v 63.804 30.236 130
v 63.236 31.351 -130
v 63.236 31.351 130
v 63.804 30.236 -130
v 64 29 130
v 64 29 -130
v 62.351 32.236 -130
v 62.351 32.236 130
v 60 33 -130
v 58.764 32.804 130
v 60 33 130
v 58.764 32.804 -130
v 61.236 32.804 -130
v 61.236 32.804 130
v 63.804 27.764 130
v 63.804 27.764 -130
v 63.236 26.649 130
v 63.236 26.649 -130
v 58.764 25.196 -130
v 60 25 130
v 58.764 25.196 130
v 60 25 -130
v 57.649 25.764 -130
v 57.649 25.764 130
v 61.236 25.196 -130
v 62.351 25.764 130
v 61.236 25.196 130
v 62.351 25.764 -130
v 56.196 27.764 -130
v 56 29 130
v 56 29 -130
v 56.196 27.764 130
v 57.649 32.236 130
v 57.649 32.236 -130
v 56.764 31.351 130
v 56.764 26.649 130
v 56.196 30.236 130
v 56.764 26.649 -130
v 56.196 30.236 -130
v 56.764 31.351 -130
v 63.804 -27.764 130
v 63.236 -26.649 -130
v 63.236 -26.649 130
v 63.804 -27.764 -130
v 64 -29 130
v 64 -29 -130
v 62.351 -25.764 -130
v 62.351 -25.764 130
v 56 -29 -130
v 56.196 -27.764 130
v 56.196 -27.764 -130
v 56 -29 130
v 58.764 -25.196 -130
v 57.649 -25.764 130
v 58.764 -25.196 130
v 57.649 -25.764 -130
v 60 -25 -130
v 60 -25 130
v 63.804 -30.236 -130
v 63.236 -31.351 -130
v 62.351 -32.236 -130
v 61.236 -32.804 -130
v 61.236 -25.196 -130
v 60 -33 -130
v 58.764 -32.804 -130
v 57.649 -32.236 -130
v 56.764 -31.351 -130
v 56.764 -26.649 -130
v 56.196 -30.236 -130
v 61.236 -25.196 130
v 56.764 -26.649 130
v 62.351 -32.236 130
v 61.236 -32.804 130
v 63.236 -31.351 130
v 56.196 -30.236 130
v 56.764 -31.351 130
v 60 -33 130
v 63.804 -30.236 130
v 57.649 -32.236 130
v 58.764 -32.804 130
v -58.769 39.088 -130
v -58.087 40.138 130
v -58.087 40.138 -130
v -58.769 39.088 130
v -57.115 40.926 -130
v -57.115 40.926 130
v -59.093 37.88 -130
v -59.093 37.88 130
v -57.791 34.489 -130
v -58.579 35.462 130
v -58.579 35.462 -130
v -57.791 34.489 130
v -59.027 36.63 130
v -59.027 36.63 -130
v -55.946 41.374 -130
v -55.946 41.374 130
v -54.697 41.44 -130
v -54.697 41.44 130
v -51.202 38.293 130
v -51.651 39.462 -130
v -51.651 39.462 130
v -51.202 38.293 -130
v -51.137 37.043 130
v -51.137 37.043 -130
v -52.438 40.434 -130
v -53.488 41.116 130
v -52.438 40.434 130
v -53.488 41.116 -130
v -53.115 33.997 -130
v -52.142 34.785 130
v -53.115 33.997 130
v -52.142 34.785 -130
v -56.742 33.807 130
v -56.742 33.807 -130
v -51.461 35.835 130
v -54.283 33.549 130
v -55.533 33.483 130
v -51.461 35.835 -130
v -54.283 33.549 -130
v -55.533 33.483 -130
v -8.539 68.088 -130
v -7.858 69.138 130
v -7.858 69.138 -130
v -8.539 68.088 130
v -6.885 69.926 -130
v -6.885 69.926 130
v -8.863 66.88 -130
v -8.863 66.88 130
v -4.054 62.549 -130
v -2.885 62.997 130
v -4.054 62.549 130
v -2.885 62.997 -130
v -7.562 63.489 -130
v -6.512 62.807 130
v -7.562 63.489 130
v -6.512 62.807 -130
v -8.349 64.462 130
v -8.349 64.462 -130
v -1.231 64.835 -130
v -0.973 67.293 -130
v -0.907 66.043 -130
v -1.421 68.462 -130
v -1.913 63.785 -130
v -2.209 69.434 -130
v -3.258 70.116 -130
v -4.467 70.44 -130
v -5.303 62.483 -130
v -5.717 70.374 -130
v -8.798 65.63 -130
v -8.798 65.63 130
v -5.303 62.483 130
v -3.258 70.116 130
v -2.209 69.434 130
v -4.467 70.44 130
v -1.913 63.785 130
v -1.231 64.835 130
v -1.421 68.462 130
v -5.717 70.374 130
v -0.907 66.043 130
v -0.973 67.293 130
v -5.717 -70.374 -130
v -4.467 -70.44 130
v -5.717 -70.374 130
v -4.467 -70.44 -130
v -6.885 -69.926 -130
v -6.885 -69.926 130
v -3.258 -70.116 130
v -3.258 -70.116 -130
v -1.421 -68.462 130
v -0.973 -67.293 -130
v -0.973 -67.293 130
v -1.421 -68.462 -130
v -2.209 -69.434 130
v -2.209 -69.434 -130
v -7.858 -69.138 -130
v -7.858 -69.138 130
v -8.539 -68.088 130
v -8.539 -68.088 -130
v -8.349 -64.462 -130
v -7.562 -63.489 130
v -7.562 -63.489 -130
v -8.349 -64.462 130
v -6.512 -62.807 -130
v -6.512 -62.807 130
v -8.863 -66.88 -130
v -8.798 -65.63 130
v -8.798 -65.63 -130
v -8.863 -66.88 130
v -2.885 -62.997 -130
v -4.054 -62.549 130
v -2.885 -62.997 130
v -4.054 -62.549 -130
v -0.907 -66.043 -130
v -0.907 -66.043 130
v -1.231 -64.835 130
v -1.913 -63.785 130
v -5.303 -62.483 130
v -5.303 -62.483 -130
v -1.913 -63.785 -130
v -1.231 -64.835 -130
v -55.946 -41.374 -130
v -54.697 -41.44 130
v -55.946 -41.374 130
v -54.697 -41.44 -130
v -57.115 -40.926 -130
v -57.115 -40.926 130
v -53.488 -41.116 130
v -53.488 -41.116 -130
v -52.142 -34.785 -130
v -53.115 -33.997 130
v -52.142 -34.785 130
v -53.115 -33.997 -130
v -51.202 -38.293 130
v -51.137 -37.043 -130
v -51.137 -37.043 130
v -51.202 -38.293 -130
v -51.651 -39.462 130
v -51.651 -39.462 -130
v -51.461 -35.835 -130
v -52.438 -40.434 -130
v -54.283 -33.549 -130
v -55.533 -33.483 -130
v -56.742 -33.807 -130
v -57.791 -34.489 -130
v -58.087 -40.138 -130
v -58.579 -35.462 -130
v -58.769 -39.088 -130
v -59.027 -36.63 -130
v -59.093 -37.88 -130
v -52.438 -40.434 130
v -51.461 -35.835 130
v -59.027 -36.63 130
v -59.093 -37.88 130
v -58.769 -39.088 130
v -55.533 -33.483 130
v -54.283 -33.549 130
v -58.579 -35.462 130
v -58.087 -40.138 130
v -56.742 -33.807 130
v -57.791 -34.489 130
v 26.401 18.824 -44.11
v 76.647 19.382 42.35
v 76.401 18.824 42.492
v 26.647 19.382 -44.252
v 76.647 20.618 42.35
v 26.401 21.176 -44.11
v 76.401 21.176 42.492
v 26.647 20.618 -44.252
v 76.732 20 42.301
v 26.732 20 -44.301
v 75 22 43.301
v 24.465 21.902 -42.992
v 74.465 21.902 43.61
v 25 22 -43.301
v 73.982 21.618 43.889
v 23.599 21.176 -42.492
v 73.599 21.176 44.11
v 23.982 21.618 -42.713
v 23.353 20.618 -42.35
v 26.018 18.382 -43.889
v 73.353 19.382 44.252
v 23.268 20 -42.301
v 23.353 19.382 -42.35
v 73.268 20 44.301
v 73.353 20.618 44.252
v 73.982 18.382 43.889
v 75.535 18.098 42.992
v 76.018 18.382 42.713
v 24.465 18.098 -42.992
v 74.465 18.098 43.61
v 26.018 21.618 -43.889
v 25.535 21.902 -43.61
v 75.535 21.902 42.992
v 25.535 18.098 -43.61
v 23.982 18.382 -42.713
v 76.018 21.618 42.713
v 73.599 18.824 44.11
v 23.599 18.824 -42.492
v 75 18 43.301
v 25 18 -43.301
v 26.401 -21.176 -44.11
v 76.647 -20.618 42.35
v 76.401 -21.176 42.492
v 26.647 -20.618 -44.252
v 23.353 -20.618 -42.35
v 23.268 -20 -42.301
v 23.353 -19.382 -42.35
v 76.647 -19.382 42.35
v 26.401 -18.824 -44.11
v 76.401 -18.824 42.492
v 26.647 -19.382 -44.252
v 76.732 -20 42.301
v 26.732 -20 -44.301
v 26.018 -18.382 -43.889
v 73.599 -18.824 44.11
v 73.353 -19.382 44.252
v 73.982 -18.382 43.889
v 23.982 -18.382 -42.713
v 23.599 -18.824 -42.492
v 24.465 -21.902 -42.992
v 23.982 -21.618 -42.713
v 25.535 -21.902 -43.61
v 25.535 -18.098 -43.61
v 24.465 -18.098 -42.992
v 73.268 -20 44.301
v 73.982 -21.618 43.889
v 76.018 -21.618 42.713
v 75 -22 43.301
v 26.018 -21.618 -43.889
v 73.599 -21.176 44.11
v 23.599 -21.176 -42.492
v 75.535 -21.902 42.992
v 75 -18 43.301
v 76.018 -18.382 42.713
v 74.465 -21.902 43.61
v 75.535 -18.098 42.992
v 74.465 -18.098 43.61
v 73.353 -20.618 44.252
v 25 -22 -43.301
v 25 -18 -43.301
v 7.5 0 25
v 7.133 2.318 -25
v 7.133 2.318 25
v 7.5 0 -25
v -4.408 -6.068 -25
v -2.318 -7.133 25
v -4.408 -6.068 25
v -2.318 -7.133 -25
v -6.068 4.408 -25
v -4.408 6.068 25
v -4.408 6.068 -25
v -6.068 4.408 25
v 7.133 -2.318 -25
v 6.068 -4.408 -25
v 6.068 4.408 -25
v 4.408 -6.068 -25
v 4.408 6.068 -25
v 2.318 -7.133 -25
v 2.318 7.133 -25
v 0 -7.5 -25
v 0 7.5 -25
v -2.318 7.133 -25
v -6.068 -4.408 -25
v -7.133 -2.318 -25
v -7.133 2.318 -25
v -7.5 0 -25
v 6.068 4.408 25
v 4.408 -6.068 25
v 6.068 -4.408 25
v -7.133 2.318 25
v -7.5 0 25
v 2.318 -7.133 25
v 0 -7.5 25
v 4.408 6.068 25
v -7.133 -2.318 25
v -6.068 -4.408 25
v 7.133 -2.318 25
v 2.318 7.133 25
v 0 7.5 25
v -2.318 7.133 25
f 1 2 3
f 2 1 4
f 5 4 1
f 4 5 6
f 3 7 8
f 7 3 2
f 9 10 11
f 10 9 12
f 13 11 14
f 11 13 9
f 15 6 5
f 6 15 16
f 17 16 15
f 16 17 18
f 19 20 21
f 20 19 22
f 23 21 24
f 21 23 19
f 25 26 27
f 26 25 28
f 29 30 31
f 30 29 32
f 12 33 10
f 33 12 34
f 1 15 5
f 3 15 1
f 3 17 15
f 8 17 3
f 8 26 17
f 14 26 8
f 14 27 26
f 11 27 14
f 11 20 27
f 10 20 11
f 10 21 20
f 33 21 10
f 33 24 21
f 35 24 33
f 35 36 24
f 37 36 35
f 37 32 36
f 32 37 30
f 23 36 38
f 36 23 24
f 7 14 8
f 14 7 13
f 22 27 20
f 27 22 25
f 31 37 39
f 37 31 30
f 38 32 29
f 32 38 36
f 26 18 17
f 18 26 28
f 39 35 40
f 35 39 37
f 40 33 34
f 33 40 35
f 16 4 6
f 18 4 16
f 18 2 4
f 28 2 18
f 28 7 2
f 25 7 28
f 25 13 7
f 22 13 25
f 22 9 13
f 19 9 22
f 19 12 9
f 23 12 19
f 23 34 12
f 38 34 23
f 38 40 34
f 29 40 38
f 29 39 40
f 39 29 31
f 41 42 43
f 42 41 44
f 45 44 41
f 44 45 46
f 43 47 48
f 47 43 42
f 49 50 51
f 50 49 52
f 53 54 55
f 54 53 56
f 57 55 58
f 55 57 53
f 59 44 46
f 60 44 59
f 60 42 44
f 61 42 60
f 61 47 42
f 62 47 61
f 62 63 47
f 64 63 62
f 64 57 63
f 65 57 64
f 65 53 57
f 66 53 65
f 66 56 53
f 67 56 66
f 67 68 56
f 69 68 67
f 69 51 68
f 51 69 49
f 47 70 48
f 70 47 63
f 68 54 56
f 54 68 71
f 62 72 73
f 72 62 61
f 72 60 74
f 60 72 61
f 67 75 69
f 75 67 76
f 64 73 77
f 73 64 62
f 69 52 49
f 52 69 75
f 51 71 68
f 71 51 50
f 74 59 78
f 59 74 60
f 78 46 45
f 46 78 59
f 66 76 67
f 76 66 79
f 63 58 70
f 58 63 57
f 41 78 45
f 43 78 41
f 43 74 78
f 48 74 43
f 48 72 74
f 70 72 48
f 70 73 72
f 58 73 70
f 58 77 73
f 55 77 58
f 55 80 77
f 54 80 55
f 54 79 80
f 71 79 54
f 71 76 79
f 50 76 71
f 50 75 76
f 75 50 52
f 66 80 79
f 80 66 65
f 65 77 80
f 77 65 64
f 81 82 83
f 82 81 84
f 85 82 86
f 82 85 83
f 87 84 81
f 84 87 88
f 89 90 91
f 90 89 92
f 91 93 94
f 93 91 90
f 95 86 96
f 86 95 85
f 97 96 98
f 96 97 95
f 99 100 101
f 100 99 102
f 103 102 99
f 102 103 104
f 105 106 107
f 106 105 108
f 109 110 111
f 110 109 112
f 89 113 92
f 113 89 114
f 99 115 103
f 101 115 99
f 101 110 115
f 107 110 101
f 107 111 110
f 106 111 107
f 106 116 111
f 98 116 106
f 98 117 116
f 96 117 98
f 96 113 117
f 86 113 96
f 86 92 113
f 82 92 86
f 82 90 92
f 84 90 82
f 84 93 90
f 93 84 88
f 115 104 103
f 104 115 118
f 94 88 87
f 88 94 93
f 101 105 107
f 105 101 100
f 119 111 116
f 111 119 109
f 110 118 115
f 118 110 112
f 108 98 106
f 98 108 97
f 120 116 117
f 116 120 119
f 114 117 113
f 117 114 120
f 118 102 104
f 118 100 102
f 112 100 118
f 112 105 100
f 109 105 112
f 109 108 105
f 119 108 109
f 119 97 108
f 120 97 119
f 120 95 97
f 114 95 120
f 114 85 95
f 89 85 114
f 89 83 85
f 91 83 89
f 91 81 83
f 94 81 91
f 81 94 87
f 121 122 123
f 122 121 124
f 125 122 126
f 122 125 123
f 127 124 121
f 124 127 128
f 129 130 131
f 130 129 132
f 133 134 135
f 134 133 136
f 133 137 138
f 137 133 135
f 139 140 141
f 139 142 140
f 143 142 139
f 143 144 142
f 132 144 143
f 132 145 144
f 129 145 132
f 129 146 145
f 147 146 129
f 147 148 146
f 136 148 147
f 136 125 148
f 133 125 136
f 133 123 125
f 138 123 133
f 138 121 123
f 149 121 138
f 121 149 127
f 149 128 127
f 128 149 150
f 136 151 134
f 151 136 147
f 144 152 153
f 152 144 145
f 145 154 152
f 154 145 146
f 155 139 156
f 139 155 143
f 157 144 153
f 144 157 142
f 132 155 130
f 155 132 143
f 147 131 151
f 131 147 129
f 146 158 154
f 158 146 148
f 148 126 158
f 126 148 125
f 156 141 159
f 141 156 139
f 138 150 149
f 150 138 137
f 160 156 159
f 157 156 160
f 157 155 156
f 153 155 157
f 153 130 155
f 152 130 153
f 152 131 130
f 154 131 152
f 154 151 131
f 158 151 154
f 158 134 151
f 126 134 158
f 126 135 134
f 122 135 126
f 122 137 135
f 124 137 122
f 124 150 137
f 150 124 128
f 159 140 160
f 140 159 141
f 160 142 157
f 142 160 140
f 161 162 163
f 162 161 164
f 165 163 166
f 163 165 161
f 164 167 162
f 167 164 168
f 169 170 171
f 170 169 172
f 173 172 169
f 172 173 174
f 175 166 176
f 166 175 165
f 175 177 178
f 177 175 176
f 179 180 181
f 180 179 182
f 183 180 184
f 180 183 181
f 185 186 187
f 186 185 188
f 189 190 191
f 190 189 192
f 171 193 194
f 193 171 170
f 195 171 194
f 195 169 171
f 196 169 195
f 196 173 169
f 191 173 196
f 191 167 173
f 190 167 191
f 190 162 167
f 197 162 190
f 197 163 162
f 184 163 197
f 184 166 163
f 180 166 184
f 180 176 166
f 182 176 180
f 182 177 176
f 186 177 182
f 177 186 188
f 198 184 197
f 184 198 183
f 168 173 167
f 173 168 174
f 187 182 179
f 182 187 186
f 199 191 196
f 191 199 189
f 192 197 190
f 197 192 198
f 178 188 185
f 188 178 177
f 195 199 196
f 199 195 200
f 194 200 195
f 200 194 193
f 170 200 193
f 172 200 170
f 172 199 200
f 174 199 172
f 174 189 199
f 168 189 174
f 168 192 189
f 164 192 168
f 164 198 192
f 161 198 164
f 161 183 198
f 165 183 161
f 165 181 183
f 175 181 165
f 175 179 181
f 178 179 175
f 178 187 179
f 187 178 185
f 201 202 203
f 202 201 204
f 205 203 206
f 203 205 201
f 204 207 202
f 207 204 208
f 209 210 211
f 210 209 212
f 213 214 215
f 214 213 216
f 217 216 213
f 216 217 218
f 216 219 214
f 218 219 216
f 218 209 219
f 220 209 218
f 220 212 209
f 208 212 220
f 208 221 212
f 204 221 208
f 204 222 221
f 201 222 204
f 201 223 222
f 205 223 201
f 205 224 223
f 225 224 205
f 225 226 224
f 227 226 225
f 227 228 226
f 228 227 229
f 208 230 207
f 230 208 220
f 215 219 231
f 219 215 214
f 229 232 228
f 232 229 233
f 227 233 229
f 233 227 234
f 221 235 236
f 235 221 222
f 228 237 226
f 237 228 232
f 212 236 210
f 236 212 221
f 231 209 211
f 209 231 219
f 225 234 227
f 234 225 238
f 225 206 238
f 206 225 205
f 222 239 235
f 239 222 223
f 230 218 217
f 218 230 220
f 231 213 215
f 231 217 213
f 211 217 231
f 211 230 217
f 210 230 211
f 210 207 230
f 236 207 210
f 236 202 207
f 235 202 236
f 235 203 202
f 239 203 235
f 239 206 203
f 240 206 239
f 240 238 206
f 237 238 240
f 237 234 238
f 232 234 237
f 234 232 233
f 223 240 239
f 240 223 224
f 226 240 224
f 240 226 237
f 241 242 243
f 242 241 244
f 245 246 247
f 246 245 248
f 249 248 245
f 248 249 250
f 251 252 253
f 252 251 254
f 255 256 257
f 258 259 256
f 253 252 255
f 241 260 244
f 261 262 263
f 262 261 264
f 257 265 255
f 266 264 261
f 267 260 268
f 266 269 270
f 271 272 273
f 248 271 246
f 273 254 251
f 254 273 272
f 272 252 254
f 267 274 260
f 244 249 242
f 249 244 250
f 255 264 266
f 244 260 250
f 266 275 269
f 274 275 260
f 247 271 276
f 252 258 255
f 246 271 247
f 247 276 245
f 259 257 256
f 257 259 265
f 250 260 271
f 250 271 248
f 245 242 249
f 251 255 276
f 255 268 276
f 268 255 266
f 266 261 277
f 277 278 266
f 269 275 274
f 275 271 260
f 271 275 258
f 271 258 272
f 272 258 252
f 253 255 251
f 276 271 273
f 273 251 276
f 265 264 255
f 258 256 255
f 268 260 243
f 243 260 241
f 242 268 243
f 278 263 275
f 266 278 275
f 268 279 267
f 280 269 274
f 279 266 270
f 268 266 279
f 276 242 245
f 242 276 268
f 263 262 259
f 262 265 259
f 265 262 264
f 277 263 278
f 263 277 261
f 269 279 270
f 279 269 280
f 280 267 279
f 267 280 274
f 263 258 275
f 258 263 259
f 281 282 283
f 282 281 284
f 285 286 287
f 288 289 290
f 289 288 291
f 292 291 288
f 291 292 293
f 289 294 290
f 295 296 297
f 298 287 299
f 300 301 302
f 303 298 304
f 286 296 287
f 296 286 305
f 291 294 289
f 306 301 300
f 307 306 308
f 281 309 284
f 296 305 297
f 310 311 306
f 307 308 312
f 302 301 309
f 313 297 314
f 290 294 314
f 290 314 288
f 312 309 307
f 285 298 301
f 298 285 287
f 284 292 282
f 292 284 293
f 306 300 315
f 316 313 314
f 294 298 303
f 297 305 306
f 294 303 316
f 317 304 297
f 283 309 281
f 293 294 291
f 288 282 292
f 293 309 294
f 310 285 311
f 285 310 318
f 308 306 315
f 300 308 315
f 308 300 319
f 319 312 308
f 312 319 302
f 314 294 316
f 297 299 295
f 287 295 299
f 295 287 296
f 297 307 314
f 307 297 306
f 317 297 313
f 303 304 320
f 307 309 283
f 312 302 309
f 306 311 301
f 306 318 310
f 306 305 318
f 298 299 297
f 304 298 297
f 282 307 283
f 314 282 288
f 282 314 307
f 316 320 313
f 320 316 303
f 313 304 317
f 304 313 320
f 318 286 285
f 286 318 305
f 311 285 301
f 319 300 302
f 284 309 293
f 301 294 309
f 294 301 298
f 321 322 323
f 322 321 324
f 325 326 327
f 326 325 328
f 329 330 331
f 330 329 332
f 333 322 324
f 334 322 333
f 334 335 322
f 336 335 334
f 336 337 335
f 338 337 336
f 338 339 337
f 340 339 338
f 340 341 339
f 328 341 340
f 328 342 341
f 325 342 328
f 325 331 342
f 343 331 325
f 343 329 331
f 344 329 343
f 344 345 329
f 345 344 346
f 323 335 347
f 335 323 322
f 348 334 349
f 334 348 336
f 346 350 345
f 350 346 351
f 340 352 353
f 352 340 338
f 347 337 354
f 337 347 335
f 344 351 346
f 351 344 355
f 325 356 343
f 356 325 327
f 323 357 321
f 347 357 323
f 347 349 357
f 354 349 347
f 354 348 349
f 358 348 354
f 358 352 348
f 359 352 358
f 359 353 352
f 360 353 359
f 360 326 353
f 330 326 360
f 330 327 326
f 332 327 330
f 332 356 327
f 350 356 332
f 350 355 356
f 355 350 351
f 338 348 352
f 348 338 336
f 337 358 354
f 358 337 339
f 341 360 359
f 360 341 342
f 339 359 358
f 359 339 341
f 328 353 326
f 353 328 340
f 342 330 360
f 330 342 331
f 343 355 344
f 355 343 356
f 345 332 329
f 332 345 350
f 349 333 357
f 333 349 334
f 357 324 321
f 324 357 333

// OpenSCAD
// file: configuration.scad
//Configuration File
//Lets you adjust pretty much everything
//
//Makes it all super paramatric
//


//Configuration Block
$fn = 20;
module configBlock(){
	difference(){
		cube([15,30,10],center=true);

		union(){  //Vertical Holes
			translate([0,10,5]) rotate([0,0,0]) cylinder(r=M3/2,h=10,center=true);
			translate([0,3,5]) rotate([0,0,0]) cylinder(r=M4/2,h=10,center=true);
			translate([0,-8,5]) rotate([0,0,0]) cylinder(r=M8/2,h=10,center=true);
		}

		union(){  //Horizontal Holes
			translate([-7.5,10,0]) rotate([0,90,0]) cylinder(r=M3h/2,h=10,center=true);		
			translate([-7.5,3,0]) rotate([0,90,0]) cylinder(r=M4h/2,h=10,center=true);
			//stranslate([0,-8,0]) rotate([0,90,0]) cylinder(r=M8/2,h=10,center=true);
		}
	}
}

//Bolts
M3 = 4;
M4 = 5;
M8 = 9;

M3h = 3.7;  //Horizontal versions
M4h = 5;  //Horizontal versions
M8h = 8; //Horizontal versions

//Nuts
M3_nut = 0;
M4_nut = 0;

//Size of other parts
rod = 8;  //Dimension of smooth rod
lm8uu = 16;

/*************************
 Printer Design files now
**************************/

//basic
arm_length = 100 ; //Length of the arms based on a planned 100x100 print size
pole_center = 60 ; //The pole distance from the center of the print
rod_sep = 25 + rod/2; // pole to pole seperation for one set. Includes rod length
rod_height = 260;

//motor end effector


//Universal joints
holewidth = 6;
arm_sep = 40;



//Hotend
// main file
include<configuration.scad>;



pd = pole_center;
angle = 30 ; //angle of arms at rest

sep = rod_sep ; //seperation of poles


for(i=[0:120:360]){
	rotate([0,0,i]) translate([pd,0,0]) union(){
		translate([0,sep,0]) cylinder(h=260, r=rod/2, center=true);
		translate([0,-sep,0]) cylinder(h=260, r=rod/2, center=true);
	}
	//rotate([0,0,i]) translate([pd-100*sin(angle)/2,0,0]) union(){
		translate([50,arm_sep/2,0]) rotate([0,angle,0]) cylinder(h=arm_length,r=2,center=true);
		translate([50,-arm_sep/2,0]) rotate([0,angle,0]) cylinder(h=arm_length,r=2,center=true);
	//}

}


cylinder(h=50, r=15/2, center=true);

translate([0,0,-100]){
%cube([100,100,100],center=true);
%cylinder(r=50,h=100,center=true);
}
